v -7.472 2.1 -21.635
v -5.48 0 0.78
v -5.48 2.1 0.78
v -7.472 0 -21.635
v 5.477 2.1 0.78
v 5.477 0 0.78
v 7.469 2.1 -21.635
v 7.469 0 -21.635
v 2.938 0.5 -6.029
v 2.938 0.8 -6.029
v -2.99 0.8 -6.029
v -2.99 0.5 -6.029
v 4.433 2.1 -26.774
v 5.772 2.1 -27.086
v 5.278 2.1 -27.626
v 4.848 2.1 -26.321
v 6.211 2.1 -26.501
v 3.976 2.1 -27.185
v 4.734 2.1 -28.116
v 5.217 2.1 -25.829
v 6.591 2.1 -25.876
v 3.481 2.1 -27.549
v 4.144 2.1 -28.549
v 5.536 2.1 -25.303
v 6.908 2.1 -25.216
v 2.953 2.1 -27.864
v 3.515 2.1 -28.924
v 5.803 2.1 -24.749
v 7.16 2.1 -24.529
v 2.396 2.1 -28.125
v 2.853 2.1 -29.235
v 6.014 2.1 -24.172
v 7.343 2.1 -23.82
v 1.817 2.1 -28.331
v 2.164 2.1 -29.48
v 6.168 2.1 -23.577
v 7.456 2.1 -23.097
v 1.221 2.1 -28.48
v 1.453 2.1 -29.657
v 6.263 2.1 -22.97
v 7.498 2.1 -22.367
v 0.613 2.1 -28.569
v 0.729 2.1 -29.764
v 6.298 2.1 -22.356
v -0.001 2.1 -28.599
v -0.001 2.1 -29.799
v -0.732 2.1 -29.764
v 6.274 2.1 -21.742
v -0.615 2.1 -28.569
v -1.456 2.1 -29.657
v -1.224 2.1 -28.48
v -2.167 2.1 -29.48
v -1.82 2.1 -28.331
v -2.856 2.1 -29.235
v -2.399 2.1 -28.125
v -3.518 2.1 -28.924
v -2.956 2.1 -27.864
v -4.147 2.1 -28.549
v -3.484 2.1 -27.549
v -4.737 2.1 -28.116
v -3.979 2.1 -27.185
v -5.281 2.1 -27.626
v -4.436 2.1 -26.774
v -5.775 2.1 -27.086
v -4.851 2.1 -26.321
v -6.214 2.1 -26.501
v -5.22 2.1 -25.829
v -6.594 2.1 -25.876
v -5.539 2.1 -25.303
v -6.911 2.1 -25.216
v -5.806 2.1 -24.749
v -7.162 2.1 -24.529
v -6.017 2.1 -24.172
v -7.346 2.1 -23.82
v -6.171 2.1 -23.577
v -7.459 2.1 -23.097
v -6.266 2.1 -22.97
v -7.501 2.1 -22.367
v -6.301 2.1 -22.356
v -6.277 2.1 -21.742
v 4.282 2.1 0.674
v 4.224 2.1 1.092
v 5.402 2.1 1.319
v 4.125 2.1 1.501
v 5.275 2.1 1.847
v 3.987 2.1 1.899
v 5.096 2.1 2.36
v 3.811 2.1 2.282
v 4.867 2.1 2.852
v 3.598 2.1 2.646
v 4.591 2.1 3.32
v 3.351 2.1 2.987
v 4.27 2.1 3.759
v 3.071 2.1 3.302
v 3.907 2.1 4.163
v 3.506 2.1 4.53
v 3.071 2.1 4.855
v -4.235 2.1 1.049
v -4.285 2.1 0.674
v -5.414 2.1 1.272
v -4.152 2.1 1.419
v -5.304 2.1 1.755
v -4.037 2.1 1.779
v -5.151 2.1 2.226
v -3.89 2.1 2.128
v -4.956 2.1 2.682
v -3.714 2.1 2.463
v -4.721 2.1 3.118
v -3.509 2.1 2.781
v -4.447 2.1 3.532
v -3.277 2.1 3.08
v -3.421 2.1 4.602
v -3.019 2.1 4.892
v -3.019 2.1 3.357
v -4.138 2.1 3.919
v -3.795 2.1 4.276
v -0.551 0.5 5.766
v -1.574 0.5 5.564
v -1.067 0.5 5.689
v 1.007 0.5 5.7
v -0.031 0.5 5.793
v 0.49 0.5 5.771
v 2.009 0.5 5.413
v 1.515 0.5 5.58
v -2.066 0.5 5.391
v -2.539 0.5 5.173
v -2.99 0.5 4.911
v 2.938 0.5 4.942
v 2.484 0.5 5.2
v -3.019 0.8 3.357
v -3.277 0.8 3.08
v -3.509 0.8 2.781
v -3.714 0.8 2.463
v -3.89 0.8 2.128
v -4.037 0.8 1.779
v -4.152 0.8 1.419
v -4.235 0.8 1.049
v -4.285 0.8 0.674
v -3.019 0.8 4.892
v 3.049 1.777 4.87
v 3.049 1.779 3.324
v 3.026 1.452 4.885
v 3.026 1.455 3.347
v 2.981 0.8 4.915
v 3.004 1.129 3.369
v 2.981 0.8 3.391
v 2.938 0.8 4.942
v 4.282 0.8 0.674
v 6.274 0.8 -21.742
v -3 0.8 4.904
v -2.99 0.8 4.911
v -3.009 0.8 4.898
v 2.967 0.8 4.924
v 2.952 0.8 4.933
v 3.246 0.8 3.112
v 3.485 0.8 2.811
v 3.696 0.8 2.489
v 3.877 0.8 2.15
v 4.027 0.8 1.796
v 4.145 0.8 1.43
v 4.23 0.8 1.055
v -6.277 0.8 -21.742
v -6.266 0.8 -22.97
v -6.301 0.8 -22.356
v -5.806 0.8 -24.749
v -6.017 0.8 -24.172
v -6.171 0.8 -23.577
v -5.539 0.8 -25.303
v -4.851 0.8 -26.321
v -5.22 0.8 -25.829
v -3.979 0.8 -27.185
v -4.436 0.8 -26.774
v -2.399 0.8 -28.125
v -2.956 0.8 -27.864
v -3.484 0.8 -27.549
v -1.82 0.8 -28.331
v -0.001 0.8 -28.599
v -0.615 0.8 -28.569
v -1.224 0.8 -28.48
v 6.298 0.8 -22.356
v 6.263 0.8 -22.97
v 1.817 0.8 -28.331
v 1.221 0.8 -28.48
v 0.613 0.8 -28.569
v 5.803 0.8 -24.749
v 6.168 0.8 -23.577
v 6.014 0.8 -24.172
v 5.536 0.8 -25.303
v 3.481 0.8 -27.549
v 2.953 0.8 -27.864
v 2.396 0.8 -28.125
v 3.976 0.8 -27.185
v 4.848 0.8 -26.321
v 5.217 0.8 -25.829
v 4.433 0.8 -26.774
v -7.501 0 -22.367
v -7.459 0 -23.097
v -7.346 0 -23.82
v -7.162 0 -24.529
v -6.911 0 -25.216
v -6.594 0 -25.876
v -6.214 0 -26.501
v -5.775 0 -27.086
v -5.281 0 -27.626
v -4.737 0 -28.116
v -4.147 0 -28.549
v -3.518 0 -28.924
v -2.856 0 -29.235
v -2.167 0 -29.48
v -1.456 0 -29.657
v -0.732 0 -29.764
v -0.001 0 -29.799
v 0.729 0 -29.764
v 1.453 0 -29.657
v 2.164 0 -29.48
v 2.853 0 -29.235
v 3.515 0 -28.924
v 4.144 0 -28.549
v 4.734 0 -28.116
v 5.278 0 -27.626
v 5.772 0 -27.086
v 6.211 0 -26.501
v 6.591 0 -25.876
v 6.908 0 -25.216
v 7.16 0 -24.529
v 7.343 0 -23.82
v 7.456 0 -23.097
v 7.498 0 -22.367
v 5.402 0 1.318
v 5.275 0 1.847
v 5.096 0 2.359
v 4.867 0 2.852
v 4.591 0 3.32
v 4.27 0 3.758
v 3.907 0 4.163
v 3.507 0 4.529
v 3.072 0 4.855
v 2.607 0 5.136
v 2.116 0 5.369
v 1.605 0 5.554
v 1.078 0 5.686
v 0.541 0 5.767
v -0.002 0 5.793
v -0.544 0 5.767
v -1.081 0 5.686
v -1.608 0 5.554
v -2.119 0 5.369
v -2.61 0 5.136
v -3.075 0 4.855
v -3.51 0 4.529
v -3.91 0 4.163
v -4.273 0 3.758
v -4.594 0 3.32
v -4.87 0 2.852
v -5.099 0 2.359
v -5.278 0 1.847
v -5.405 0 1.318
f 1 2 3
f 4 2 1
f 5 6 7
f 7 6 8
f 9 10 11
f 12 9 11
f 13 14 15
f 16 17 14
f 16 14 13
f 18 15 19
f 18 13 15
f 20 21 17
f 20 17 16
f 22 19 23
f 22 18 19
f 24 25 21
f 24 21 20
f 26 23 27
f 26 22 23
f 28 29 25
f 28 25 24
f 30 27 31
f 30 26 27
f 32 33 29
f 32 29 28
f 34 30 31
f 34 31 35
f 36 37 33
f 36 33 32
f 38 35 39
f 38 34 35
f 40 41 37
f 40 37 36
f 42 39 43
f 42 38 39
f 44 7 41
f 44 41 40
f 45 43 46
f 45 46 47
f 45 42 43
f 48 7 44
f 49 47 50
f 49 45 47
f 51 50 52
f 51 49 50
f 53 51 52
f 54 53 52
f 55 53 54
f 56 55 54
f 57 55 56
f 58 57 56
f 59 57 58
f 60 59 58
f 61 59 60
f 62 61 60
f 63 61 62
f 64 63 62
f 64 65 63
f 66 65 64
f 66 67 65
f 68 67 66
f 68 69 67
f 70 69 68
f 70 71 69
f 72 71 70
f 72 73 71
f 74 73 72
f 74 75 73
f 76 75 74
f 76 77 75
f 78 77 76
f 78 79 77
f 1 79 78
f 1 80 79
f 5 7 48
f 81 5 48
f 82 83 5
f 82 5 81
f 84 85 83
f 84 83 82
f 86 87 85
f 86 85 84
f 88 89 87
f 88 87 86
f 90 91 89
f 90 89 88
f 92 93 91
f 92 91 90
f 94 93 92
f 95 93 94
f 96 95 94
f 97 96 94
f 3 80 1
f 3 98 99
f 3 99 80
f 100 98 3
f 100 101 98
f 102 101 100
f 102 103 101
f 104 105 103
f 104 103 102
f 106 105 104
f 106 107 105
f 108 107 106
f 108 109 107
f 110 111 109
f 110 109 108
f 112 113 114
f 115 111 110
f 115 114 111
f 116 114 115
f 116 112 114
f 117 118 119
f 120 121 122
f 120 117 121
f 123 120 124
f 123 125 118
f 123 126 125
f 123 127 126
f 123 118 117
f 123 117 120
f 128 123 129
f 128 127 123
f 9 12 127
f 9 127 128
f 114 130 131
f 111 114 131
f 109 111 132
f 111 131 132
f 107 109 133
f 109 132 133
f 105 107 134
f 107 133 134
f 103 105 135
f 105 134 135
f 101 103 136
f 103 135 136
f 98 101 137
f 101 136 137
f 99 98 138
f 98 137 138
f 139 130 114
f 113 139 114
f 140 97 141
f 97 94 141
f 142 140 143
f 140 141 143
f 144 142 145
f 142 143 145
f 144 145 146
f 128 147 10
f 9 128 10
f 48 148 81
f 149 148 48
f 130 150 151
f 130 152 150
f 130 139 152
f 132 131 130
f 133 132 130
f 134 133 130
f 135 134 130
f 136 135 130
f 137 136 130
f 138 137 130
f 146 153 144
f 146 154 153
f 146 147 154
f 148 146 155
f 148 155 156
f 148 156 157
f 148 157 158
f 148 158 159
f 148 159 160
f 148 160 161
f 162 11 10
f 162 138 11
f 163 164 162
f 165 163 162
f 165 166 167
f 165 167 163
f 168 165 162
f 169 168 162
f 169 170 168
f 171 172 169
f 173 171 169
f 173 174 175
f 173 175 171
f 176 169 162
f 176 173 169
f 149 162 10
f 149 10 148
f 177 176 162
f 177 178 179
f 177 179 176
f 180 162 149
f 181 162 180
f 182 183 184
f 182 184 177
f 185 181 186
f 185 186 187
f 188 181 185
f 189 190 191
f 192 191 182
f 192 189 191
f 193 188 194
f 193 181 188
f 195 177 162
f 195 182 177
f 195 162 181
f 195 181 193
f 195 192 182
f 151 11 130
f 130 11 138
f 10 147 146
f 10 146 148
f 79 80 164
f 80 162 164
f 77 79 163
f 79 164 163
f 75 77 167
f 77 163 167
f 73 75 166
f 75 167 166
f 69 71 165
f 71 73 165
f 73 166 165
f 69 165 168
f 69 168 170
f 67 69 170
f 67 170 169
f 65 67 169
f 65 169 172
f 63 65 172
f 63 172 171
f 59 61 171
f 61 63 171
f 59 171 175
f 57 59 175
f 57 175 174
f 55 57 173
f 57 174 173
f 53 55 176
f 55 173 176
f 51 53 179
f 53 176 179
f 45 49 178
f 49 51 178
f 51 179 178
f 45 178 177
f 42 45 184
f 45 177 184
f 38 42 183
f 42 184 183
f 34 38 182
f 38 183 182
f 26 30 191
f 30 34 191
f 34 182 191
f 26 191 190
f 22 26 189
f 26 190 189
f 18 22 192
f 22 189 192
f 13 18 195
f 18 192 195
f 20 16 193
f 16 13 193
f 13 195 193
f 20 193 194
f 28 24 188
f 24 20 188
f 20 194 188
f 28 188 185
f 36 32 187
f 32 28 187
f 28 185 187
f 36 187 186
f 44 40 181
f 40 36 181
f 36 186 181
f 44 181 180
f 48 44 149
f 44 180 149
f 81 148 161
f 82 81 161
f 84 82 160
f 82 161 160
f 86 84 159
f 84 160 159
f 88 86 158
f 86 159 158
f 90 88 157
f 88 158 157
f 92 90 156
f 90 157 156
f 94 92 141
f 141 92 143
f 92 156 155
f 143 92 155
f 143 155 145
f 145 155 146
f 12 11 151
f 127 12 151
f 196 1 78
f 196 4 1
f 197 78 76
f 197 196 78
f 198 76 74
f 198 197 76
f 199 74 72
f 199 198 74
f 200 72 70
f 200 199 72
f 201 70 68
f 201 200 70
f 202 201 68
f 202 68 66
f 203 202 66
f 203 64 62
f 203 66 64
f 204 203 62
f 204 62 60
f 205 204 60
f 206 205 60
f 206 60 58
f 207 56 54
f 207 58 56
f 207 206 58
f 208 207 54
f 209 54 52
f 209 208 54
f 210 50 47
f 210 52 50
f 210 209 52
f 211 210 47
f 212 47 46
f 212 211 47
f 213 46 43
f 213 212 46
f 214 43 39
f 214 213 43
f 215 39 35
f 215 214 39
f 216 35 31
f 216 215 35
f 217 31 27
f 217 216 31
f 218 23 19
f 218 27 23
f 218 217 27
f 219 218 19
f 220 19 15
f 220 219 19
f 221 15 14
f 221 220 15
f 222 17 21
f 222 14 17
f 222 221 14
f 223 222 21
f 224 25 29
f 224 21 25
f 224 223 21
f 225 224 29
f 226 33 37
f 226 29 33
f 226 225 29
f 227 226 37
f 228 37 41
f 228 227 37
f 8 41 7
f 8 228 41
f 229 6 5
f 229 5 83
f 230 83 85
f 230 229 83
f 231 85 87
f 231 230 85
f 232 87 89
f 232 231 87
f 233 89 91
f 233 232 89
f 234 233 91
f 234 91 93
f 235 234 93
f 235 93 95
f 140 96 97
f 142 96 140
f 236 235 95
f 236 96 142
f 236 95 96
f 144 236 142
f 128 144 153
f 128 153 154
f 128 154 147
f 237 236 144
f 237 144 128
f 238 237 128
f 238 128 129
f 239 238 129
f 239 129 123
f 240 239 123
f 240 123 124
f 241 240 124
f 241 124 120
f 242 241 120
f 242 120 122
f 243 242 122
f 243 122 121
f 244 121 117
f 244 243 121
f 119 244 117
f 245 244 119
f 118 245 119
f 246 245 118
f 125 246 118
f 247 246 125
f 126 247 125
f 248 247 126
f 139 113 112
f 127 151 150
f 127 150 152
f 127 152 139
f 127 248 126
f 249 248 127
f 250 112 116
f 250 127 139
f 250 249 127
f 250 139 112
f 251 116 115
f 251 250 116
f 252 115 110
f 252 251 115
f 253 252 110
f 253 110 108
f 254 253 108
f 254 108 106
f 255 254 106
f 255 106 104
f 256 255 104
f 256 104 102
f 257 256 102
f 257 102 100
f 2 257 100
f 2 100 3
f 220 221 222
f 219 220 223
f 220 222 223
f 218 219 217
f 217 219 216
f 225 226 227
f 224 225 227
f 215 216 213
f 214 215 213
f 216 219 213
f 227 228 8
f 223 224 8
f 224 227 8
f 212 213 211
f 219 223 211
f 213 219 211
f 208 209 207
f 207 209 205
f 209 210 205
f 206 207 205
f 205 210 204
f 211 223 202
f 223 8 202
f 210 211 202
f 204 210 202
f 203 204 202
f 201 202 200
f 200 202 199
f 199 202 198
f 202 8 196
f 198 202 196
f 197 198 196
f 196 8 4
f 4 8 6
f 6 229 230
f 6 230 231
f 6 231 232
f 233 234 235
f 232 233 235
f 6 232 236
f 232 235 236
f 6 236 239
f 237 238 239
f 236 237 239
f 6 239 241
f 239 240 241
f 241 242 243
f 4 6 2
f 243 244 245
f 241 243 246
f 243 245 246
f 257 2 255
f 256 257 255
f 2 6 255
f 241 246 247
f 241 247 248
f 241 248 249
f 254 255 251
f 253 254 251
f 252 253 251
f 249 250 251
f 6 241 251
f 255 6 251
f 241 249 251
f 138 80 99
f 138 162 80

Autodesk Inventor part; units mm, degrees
ref_plane "YZ Plane" through (0, 0, 0) normal (1, 0, 0) x (0, 1, 0)
ref_plane "XZ Plane" through (0, 0, 0) normal (0, 1, 0) x (-1, 0, 0)
ref_plane "XY Plane" through (0, 0, 0) normal (0, 0, 1) x (1, 0, 0)
sketch "Sketch1" plane through (0, 0, 0) normal (0, 1, 0) x (-1, 0, 0)
  arc A0 (5.4799, 0.7804) -> (-5.4769, 0.7804) centre (0.0015, 0.2935) ccw
  arc A1 (-7.4691, -21.6354) -> (7.472, -21.6354) centre (0.0015, -22.2993) ccw
  line L0 (-5.4769, 0.7804) -> (-7.4691, -21.6354)
  line L1 (5.4799, 0.7804) -> (7.472, -21.6354)
  line L2 (6.2767, -21.7416) -> (4.2846, 0.6742)
  arc A2 (4.2846, 0.6742) -> (-4.2816, 0.6742) centre (0.0015, 0.2935) ccw
  line L3 (-4.2816, 0.6742) -> (-6.2738, -21.7416)
  arc A3 (-6.2738, -21.7416) -> (6.2767, -21.7416) centre (0.0015, -22.2993) ccw
  dimension "d18" = 11
  dimension "d19" = 15
  dimension "d22" = 1.2
extrude "Extrusion7" add sketch "Sketch1" along normal blind 2.1
extrude "Extrusion8" add sketch "Sketch1" along normal blind 0.8 contours A3 L3 A2 L2
sketch "Sketch5" plane through (0, 0, 0) normal (0, 0, 1) x (1, 0, 0)
  line L0 (-3.019, 0.8) -> (2.981, 0.8)
  line L1 (5.4769, 0) -> (-5.4799, 0) projected
  line L2 (-3.019, 0.8) -> (-3.019, 4.3274)
  line L3 (-3.019, 4.3274) -> (3.2255, 4.3274)
  line L4 (3.2255, 4.3274) -> (2.981, 0.8)
  point P0 (0, 0)
  point P1 (-0.0015, 0)
  dimension "d27" = 6
  dimension "d28" = 0.8
extrude "Extrusion9" cut sketch "Sketch5" along normal blind 14.7
sketch "Sketch6" plane through (0, 0.8, 0) normal (0, 1, 0) x (1, 0, 0)
  line L0 (-2.99, -5.9206) -> (2.938, -5.9206)
  line L1 (2.938, -5.9206) -> (2.938, 6.0287)
  line L2 (2.938, 6.0287) -> (-2.99, 6.0287)
  line L3 (-2.99, 6.0287) -> (-2.99, -5.9206)
  point P0 (0, 0)
extrude "Extrusion10" cut sketch "Sketch6" against normal blind 0.3
properties part number "Tapa1_3DPrint"
